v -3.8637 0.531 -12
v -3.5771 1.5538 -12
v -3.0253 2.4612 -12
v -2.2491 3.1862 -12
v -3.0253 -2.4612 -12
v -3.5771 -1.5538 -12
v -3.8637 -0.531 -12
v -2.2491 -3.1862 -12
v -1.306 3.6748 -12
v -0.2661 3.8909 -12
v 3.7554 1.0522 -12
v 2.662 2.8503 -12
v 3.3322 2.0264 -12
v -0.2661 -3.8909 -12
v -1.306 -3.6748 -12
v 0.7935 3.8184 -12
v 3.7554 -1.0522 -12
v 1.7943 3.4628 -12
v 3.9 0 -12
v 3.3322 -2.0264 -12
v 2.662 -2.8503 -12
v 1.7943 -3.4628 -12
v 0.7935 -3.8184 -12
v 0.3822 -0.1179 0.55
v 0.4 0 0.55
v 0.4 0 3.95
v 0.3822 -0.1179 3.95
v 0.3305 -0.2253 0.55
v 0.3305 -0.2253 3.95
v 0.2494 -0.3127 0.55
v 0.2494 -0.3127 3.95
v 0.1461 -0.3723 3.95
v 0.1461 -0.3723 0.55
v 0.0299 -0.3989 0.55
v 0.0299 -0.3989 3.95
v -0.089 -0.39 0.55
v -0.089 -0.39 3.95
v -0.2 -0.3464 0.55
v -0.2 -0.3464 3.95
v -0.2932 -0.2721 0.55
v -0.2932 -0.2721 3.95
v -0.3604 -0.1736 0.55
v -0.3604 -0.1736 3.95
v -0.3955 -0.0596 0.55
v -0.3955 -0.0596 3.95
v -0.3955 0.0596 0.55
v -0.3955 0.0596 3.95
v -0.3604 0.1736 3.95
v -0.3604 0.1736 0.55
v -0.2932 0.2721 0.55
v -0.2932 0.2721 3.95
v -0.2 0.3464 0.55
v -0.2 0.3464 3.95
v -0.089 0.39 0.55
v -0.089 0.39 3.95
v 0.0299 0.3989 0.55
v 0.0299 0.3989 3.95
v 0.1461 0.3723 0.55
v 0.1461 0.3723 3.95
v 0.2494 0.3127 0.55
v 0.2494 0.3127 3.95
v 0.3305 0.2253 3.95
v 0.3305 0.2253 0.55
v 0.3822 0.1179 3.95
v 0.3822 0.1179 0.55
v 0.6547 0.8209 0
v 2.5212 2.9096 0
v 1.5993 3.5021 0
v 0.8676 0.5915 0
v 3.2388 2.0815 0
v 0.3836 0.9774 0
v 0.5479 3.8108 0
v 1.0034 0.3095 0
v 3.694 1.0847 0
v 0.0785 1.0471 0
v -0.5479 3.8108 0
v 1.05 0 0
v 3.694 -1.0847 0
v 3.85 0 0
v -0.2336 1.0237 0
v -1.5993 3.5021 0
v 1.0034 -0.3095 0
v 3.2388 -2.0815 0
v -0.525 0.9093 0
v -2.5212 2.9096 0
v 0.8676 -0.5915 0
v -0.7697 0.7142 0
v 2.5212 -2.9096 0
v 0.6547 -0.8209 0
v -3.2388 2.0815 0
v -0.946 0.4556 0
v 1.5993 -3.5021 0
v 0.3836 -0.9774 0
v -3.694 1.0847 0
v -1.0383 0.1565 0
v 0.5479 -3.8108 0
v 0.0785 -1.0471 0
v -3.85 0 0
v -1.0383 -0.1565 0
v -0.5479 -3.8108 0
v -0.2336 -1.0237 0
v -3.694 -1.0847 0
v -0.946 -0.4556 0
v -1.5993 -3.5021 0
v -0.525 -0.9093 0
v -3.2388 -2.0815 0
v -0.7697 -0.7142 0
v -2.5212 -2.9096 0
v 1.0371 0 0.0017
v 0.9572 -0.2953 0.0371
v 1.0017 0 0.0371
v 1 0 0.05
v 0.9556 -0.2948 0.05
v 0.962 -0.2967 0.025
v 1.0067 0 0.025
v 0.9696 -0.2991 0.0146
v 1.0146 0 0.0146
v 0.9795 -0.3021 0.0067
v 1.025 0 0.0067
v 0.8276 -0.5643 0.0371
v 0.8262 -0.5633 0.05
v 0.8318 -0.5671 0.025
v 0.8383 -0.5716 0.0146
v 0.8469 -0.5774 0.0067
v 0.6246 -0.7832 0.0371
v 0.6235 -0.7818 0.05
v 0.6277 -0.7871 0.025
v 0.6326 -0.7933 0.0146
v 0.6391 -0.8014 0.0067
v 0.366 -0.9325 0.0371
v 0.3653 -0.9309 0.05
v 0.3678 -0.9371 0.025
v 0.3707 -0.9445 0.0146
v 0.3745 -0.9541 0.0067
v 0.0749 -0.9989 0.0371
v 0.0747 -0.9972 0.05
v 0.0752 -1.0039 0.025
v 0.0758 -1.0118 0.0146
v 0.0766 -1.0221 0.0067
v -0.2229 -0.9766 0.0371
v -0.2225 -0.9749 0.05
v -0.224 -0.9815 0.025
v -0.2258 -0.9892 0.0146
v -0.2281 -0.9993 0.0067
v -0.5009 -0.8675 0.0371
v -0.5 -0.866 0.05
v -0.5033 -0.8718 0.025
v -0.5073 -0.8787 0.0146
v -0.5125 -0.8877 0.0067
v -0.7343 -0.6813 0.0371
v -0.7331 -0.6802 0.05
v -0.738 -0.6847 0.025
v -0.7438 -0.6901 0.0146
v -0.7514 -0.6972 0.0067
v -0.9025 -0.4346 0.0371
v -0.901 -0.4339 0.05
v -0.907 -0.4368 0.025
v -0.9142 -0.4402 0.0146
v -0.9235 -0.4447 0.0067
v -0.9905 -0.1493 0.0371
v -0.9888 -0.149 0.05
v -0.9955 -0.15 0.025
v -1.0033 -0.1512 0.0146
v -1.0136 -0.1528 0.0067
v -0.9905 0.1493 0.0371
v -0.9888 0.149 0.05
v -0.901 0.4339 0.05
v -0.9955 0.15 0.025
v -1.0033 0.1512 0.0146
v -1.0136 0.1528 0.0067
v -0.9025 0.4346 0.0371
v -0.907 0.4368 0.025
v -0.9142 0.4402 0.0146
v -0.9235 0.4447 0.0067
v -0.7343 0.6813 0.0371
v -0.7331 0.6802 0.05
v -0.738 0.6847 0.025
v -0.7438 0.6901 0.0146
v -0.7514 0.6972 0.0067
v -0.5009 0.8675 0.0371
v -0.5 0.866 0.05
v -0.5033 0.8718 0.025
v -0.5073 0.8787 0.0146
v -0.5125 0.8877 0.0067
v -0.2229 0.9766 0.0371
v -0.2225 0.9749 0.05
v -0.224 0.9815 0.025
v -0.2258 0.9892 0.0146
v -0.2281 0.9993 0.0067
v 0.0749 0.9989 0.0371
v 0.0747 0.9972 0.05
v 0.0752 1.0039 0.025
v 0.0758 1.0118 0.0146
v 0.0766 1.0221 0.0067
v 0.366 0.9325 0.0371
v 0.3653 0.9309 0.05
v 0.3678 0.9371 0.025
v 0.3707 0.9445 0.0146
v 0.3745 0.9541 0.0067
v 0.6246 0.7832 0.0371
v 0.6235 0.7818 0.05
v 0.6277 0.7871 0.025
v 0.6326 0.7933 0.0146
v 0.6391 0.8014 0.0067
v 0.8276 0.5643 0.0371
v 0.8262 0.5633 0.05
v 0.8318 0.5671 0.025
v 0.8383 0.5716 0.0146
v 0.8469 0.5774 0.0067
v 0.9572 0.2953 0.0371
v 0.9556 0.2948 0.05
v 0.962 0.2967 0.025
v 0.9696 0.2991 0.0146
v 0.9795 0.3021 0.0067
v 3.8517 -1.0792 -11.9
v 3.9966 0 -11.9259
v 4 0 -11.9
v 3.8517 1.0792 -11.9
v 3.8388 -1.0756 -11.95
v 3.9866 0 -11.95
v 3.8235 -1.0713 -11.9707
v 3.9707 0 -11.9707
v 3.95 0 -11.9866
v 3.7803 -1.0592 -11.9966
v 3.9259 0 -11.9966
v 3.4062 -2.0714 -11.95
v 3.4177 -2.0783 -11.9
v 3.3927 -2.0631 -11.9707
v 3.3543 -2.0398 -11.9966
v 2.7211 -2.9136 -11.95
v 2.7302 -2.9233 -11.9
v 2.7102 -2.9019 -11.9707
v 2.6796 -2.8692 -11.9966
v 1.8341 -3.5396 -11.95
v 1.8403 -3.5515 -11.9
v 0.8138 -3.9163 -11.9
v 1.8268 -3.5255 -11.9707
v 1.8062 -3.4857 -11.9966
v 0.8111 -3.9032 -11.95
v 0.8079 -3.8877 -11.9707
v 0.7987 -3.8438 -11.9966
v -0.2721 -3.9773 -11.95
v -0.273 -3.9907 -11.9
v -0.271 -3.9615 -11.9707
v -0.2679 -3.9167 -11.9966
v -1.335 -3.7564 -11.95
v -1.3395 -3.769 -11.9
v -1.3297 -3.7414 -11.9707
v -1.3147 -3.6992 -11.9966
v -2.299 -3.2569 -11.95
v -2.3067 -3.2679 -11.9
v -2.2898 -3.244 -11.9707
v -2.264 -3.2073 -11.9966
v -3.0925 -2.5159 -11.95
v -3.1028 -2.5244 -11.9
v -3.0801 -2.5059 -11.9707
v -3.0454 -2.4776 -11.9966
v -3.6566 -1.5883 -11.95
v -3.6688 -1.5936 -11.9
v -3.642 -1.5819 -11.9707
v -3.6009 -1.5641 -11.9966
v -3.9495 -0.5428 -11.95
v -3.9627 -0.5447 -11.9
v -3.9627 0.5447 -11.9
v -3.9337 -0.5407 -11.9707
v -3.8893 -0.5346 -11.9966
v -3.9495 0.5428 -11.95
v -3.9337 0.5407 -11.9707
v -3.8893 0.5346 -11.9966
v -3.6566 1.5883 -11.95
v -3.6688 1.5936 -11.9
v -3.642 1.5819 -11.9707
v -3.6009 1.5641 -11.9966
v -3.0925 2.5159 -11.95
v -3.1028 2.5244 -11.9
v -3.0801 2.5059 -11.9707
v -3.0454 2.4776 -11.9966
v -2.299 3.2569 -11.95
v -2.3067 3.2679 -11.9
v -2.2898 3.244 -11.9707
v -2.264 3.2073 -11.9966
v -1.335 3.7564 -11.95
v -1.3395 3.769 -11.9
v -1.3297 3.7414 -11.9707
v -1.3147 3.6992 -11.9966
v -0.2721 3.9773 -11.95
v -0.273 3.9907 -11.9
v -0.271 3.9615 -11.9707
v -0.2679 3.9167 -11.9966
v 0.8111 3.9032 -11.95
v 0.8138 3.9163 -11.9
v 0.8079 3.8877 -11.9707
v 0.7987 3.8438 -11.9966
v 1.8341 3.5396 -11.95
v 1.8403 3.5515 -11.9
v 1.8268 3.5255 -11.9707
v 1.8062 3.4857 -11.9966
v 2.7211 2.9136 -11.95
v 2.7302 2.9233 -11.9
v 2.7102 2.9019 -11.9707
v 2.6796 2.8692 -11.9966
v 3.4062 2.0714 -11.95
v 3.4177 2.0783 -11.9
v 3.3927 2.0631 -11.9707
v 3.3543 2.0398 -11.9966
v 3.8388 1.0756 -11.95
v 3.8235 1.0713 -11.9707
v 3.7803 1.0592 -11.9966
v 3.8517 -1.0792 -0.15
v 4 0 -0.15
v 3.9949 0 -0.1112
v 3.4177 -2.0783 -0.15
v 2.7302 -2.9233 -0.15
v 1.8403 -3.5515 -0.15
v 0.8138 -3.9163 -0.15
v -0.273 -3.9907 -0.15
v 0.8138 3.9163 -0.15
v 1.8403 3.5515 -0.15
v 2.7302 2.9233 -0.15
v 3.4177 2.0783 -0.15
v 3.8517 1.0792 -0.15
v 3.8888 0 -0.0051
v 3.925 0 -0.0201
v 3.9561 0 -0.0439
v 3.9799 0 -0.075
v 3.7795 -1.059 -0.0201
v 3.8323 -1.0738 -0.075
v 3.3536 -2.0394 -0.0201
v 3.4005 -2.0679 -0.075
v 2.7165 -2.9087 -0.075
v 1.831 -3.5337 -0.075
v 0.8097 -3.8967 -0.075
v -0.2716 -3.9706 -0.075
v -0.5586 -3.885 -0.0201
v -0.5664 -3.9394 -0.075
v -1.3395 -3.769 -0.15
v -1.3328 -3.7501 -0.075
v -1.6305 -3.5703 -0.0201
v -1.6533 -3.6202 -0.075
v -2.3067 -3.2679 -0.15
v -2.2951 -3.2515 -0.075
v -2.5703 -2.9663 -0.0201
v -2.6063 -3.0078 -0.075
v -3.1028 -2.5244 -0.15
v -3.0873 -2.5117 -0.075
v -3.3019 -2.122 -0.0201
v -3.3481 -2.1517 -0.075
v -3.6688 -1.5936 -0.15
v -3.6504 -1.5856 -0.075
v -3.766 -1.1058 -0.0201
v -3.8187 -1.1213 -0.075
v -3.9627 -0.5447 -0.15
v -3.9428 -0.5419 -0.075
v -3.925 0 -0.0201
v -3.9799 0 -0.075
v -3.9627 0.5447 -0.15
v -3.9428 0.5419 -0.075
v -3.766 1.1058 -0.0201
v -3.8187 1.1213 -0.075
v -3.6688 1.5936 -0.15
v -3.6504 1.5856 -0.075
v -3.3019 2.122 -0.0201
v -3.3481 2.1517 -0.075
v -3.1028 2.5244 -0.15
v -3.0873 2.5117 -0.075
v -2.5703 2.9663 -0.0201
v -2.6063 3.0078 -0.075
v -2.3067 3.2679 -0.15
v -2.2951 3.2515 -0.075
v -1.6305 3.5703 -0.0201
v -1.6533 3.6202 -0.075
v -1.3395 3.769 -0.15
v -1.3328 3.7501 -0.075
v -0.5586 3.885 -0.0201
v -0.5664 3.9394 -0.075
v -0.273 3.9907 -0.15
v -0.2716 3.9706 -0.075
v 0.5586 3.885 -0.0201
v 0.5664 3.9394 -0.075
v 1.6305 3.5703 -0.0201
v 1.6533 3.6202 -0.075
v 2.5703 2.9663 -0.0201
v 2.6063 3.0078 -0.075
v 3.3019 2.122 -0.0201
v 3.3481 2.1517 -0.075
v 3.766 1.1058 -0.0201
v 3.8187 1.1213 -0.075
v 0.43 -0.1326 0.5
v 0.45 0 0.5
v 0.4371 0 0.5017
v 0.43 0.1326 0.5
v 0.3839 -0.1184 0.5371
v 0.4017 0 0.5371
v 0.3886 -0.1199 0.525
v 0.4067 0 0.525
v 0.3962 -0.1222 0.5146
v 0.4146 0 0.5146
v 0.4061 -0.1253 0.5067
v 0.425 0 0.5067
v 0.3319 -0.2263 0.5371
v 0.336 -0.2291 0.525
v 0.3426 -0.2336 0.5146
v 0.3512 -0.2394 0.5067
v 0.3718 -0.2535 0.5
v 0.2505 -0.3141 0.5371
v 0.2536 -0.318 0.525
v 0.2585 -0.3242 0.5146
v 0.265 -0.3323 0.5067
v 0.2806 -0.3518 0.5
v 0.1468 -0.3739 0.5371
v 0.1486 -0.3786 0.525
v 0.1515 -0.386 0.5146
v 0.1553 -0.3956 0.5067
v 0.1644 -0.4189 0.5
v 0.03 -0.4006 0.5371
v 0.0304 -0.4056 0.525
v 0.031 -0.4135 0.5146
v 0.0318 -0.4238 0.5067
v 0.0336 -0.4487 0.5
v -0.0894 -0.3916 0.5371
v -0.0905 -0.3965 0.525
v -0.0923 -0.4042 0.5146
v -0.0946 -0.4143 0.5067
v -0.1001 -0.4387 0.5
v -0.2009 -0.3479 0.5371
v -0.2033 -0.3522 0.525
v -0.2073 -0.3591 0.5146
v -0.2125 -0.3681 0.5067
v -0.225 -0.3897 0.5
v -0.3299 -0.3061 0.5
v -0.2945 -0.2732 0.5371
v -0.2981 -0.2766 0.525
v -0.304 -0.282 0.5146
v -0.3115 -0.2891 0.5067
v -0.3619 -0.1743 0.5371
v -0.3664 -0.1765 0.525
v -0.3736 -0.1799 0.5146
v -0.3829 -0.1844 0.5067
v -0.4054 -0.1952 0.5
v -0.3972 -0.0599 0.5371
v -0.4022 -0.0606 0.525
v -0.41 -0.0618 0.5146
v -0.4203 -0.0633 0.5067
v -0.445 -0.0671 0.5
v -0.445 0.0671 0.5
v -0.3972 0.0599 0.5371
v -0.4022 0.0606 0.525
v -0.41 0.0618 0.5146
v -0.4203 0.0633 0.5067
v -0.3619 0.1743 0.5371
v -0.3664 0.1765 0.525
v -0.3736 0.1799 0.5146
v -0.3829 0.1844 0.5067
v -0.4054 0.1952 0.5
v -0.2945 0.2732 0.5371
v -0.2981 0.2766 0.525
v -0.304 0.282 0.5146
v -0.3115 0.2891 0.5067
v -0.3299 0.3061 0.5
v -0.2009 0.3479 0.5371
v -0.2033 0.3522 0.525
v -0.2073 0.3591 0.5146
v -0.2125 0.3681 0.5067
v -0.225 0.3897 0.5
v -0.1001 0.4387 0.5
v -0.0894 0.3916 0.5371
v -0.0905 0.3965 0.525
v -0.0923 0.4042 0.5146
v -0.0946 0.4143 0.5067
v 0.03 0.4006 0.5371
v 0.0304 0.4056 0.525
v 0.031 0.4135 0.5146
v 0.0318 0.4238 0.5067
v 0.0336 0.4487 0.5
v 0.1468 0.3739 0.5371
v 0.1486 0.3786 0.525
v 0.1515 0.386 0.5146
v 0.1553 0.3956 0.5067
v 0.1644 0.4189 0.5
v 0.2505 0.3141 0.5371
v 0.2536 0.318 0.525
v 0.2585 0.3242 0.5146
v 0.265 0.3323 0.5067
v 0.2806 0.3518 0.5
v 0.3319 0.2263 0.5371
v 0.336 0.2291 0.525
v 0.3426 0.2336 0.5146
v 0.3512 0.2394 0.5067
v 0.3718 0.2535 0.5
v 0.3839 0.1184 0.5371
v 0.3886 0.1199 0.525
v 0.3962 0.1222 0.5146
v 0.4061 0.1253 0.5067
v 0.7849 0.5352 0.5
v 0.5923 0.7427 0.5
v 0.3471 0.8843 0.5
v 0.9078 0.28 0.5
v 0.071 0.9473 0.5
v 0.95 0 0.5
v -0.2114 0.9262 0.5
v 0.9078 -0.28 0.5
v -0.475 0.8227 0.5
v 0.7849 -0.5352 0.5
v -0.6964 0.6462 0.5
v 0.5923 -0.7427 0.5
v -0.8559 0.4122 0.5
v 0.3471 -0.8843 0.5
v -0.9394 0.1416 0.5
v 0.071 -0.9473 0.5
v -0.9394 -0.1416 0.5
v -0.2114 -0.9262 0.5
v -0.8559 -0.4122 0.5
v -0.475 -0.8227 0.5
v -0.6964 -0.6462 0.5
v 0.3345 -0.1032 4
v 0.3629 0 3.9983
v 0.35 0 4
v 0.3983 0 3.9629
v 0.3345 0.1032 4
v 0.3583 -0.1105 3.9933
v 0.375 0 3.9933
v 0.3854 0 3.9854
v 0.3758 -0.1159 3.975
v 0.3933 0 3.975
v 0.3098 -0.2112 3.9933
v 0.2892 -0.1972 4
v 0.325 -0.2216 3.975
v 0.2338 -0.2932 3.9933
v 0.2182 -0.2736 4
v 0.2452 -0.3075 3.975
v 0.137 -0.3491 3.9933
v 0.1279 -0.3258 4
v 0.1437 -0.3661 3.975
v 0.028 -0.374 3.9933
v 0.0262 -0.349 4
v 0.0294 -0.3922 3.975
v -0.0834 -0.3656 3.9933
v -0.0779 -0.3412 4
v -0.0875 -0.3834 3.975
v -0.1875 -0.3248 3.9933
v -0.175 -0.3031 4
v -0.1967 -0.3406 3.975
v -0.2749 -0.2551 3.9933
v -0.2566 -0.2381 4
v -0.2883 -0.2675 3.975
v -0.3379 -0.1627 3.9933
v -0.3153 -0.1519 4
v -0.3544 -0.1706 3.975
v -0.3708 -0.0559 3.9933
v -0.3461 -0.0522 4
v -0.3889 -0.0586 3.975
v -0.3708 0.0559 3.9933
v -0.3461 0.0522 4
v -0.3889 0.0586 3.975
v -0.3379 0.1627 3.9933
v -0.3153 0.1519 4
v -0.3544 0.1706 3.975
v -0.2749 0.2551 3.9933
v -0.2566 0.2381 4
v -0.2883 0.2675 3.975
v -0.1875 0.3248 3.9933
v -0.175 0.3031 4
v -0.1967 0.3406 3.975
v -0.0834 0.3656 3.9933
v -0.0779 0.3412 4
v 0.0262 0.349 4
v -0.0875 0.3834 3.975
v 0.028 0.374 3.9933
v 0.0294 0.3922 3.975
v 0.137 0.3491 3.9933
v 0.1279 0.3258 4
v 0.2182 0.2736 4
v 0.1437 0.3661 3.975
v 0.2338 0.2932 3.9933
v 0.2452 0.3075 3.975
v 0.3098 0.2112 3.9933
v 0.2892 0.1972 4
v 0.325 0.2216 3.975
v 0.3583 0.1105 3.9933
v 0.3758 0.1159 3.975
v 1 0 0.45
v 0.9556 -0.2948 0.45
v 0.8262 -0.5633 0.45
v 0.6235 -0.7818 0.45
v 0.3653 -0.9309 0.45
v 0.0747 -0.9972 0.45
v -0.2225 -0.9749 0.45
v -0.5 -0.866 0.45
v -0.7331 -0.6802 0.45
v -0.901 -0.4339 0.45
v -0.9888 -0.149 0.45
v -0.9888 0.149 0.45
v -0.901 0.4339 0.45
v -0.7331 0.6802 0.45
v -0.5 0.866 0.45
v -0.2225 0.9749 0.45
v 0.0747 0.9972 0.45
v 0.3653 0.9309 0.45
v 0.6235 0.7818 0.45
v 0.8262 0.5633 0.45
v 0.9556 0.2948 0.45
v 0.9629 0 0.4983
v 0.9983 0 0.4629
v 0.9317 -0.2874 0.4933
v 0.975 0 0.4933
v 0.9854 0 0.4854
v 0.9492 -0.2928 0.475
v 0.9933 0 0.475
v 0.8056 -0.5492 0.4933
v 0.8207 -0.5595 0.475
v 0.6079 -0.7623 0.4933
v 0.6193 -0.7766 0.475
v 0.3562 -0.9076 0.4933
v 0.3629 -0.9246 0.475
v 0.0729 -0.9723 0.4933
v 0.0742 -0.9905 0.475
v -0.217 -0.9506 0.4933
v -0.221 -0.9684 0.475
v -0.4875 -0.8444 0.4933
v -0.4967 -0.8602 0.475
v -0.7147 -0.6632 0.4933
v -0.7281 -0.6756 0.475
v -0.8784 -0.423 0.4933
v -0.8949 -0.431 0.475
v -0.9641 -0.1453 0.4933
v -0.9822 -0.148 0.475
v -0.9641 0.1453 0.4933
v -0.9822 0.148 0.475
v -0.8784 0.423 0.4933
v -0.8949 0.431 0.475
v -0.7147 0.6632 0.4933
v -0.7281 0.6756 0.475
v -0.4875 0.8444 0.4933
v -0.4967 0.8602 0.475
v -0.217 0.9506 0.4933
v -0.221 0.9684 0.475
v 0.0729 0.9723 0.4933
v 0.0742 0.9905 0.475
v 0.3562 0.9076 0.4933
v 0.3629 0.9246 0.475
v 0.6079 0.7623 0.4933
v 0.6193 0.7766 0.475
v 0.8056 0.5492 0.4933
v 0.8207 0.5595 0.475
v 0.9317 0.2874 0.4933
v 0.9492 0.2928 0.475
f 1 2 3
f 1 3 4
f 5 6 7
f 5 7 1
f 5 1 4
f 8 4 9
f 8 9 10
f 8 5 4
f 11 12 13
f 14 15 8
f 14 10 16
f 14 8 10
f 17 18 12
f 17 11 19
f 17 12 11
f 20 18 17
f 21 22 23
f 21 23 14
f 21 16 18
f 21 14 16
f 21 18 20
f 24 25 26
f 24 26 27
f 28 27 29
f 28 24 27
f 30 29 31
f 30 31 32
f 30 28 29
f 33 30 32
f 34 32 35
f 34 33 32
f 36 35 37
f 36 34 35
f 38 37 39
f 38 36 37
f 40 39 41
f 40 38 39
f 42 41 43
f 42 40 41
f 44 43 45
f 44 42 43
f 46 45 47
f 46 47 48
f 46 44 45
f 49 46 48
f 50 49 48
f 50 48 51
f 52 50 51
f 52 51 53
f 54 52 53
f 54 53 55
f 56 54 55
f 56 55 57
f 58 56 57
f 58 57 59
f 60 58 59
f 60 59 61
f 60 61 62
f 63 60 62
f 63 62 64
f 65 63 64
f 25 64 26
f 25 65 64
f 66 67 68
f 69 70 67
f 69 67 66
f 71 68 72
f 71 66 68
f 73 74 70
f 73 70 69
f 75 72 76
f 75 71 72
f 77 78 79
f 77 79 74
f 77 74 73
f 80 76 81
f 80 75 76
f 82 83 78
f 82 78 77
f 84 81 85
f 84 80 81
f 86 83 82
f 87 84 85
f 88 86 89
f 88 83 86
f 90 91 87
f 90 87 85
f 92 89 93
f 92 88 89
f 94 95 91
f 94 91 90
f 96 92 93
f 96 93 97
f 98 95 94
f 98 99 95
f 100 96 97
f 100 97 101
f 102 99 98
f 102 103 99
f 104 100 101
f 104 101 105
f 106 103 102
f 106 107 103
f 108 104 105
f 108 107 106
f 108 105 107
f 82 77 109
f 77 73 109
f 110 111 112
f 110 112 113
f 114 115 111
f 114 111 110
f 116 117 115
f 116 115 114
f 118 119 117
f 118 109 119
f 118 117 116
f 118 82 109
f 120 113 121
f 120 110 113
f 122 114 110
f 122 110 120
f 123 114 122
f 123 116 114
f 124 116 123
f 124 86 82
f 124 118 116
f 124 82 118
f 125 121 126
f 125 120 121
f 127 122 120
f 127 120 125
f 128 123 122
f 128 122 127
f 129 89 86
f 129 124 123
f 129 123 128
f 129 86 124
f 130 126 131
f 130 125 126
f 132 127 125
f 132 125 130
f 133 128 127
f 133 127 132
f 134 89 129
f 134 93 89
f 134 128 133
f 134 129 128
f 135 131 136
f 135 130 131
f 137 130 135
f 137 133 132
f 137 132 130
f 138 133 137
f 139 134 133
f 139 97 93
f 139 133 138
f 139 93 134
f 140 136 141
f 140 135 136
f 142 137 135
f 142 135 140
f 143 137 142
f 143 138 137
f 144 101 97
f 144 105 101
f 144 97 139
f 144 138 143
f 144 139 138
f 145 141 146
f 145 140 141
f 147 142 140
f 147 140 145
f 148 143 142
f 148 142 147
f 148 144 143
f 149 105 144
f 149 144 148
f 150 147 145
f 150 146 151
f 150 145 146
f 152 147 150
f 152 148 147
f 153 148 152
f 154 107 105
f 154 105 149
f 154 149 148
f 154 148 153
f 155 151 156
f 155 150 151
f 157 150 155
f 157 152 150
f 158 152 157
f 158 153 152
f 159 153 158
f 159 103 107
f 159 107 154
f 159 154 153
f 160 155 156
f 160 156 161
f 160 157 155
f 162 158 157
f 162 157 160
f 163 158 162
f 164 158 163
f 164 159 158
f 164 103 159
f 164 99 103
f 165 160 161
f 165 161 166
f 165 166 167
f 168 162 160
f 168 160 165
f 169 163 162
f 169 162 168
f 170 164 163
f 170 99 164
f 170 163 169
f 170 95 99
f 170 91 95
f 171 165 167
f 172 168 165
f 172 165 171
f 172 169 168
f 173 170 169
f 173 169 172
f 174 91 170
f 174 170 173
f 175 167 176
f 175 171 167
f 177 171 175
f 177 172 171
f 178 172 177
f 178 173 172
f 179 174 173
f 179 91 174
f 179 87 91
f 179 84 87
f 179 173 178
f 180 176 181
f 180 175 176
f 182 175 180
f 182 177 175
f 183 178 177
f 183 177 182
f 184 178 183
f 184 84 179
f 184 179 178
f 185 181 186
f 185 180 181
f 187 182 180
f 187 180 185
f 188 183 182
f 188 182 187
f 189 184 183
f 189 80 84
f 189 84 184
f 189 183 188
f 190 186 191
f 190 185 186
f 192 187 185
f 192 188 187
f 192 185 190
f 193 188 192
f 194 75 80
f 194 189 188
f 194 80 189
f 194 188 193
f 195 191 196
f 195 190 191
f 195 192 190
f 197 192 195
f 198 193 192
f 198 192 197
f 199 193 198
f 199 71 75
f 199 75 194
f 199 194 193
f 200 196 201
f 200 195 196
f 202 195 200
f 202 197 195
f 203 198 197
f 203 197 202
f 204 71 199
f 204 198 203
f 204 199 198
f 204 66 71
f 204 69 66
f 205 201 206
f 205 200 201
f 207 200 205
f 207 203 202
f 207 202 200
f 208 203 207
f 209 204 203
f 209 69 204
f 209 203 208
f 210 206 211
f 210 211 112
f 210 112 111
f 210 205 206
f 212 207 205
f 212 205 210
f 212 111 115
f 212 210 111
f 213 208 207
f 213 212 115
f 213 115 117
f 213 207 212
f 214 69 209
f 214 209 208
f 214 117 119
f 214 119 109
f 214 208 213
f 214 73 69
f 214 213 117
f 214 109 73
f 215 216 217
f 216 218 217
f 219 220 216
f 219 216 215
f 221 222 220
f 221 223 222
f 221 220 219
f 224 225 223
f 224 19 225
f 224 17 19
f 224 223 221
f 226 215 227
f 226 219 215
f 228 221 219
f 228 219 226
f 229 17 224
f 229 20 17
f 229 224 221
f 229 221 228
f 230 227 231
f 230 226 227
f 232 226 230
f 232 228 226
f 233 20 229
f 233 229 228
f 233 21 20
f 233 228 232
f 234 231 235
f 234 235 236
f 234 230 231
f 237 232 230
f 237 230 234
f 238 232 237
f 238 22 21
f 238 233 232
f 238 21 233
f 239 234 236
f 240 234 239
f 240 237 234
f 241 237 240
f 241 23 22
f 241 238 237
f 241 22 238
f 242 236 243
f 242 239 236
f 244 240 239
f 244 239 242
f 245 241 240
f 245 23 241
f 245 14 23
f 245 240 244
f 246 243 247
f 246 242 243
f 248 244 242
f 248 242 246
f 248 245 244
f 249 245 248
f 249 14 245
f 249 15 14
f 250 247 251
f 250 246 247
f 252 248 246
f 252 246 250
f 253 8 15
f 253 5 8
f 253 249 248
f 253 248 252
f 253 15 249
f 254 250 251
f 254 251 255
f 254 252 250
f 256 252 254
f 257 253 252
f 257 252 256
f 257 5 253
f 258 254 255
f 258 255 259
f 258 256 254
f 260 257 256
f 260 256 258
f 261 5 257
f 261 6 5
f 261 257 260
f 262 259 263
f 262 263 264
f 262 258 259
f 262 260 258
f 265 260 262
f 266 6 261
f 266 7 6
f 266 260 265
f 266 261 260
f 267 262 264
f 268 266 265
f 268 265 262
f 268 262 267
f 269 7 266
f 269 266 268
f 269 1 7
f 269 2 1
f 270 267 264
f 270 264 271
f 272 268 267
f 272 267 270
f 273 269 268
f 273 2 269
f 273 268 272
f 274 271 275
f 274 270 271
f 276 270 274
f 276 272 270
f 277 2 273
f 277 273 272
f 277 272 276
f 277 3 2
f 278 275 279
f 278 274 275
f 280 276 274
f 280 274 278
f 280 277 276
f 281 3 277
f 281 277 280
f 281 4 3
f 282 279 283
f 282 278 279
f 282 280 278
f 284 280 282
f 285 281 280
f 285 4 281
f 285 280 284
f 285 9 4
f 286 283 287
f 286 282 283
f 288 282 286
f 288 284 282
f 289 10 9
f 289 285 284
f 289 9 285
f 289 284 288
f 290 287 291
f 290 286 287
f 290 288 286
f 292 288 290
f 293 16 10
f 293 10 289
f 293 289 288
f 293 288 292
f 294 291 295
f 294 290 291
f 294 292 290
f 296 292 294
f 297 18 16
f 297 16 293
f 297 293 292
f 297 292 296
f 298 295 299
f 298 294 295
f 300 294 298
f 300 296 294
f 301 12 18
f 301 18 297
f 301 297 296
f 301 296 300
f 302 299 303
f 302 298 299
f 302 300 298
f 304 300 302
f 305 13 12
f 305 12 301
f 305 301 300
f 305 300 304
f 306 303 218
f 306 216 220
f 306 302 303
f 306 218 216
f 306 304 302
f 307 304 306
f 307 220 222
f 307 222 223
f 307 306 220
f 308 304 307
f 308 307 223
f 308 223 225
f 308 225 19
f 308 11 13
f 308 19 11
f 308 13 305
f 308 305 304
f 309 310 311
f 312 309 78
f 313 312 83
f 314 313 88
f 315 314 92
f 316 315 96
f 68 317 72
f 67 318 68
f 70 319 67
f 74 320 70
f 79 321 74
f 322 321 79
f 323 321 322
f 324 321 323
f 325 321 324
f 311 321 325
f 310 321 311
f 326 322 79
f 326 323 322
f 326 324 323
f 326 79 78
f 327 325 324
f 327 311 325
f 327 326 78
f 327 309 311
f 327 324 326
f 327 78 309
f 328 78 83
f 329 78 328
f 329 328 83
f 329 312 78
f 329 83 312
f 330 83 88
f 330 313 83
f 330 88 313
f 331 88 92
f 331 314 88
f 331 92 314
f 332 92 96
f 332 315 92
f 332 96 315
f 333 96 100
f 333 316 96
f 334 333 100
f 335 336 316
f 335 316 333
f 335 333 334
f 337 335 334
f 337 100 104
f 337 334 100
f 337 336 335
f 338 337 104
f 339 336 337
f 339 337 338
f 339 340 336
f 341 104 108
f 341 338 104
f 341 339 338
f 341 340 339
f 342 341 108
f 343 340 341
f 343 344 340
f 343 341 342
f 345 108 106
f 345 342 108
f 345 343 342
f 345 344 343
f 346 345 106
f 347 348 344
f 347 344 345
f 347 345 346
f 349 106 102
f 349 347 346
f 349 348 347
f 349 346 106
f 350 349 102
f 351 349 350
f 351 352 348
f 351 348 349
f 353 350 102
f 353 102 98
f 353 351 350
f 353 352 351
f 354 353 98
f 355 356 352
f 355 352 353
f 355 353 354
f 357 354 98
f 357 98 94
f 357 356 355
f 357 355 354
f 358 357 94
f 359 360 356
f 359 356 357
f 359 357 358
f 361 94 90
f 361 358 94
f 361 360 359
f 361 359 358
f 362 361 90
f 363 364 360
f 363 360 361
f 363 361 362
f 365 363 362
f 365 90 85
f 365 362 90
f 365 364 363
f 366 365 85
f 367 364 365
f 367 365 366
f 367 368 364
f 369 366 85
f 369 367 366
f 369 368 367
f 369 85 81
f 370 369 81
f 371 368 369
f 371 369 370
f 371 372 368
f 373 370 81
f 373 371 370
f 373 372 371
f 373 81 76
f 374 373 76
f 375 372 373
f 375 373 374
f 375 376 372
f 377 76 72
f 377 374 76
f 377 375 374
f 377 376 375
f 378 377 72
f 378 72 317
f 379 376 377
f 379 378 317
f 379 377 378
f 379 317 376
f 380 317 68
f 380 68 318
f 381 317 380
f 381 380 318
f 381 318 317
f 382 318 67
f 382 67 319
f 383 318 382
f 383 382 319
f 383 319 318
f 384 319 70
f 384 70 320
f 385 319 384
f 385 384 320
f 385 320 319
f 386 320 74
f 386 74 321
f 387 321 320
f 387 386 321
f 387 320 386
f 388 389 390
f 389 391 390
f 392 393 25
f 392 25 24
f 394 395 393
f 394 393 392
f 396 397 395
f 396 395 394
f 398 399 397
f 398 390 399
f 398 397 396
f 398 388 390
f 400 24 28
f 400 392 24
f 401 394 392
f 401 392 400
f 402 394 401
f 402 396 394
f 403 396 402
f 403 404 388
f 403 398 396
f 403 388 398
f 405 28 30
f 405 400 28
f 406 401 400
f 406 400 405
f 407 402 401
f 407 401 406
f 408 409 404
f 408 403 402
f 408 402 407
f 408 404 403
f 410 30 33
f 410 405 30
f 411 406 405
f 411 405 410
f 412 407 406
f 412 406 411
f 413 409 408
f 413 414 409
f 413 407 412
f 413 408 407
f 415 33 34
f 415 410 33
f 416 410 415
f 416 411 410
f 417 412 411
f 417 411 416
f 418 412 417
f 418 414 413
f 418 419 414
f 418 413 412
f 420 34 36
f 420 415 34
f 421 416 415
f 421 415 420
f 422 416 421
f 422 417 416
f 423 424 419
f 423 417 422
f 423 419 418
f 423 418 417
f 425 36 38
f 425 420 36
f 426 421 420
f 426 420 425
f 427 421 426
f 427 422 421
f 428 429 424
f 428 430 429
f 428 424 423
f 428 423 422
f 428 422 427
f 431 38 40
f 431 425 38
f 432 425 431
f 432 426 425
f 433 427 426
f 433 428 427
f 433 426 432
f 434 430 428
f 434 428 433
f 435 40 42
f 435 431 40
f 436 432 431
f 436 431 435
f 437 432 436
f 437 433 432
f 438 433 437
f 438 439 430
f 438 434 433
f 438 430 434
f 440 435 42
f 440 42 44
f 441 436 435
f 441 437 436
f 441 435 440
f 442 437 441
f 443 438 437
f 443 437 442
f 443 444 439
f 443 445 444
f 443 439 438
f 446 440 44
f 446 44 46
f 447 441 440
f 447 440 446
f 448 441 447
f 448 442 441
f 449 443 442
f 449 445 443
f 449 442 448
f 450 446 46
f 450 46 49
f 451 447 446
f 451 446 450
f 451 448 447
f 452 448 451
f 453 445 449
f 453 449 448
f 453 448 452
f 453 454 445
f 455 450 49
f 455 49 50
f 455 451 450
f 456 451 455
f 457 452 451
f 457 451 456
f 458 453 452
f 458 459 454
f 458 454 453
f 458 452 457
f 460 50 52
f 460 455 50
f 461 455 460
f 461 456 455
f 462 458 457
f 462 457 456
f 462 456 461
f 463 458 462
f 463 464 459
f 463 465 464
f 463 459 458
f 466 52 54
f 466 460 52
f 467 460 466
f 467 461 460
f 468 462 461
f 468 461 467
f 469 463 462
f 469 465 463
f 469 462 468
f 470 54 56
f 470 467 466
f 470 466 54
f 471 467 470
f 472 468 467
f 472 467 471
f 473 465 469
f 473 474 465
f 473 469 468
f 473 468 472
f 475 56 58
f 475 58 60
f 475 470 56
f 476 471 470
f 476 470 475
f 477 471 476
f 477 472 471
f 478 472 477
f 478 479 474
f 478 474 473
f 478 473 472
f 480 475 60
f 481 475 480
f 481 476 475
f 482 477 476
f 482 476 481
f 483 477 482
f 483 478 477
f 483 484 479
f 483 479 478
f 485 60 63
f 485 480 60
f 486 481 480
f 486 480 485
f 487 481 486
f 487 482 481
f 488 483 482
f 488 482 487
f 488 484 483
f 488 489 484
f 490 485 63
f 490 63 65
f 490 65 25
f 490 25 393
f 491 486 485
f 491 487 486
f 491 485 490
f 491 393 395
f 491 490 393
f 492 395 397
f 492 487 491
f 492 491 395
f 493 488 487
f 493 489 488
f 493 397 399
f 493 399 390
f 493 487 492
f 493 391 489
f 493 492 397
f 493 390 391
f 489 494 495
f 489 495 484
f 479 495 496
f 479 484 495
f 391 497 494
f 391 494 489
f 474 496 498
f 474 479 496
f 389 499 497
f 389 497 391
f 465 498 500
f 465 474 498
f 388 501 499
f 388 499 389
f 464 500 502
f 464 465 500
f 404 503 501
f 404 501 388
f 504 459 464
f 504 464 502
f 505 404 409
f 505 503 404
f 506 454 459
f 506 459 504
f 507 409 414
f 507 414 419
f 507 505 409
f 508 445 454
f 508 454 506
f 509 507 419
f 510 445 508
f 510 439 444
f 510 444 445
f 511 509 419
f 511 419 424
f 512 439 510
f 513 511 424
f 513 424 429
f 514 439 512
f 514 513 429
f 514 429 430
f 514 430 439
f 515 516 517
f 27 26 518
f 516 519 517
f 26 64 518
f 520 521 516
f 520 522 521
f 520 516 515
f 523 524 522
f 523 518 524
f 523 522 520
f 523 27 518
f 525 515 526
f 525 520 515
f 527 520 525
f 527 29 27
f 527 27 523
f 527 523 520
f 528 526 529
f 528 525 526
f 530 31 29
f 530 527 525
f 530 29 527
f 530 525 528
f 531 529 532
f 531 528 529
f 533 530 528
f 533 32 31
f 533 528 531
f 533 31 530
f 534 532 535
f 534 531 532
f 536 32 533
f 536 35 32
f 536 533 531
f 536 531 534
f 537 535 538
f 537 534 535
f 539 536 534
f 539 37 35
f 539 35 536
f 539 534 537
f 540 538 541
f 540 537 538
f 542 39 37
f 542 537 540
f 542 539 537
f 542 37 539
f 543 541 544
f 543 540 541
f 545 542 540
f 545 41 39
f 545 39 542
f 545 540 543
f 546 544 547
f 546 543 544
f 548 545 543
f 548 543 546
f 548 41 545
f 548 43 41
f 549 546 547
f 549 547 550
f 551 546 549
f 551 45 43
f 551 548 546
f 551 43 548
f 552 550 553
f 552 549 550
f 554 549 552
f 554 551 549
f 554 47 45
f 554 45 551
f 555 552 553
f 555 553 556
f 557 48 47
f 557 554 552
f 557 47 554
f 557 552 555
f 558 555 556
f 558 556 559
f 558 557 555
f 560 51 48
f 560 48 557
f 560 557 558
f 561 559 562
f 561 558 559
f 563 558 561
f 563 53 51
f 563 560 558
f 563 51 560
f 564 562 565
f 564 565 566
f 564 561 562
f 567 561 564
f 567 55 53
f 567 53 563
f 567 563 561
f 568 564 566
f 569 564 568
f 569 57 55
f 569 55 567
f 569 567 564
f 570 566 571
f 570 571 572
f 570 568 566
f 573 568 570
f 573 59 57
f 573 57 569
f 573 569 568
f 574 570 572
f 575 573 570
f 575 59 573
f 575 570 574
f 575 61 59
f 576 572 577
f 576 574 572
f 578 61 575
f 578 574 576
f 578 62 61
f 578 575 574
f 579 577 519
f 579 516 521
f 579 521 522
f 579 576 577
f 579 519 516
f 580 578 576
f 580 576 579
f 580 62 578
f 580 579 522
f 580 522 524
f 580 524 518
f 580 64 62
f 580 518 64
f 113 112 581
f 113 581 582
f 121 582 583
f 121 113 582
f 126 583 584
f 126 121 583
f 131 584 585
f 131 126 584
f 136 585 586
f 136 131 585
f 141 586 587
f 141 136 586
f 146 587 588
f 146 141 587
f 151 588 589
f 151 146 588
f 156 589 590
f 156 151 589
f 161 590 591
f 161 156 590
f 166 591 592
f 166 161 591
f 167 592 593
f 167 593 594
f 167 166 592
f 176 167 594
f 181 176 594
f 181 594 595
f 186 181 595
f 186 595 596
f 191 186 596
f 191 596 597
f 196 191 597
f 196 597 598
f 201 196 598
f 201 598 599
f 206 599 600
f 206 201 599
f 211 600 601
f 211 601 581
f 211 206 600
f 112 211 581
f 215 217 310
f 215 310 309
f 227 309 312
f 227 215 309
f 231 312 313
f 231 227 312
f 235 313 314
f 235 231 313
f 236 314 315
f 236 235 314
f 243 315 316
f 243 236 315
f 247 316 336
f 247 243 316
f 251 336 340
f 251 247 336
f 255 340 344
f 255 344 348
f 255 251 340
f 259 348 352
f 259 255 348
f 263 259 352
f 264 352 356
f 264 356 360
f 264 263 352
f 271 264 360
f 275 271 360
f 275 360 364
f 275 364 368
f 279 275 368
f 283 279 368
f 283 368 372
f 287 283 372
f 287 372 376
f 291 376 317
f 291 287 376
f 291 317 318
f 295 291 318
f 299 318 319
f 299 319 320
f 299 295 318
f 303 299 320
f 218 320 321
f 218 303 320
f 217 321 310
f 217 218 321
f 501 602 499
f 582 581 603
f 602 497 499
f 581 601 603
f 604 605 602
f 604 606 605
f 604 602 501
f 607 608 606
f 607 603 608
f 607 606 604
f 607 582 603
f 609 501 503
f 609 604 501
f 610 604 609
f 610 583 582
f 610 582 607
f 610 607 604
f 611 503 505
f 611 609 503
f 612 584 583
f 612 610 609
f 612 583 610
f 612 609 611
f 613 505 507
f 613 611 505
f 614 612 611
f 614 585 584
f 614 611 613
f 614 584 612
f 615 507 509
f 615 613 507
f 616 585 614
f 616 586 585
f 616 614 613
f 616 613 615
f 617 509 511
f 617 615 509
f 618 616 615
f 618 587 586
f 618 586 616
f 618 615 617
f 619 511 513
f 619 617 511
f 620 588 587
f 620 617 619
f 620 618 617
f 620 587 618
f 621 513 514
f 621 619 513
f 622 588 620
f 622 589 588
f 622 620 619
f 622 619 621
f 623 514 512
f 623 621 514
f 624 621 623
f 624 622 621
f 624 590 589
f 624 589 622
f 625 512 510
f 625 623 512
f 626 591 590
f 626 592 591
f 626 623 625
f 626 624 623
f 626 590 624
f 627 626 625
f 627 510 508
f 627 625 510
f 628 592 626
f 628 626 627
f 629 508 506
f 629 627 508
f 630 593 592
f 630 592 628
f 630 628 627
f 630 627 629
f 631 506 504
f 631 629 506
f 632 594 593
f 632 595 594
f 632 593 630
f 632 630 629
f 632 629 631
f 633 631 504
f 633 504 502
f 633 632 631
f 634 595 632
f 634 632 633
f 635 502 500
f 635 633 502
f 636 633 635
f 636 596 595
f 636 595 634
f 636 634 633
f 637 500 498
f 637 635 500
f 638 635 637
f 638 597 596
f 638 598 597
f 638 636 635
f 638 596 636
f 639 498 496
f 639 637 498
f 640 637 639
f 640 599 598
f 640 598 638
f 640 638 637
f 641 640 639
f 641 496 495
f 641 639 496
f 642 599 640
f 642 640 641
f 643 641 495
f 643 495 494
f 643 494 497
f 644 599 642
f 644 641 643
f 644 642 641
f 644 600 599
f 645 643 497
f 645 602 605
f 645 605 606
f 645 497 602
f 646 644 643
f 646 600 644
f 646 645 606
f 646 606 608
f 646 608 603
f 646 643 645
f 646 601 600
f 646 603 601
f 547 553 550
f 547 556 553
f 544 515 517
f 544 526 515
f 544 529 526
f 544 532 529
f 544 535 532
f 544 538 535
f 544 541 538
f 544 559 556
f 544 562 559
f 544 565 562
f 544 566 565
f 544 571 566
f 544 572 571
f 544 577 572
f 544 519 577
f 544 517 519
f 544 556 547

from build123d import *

# Parameters (mm, degrees)
FILLET1_R = 0.05
FILLET3_R = 0.15
FILLET4_R = 0.1


with BuildPart() as part:
    # Sketch1 → Revolve1 (revolve)
    with BuildSketch(Plane(origin=(0, 0, 0), x_dir=(0, 0, -1), z_dir=(1, 0, 0)), mode=Mode.PRIVATE) as revolve1_sk:
        Polygon((0, 4), (12, 4), (12, 0), (-4, 0), (-4, 0.4), (-0.5, 0.4), (-0.5, 1), (0, 1), align=None)
    revolve(revolve1_sk.sketch.rotate(Axis((0, 0, 94.83033259), (0, 0, -1)), 90), axis=Axis((0, 0, 94.83033259), (0, 0, -1)))

    # Fillet1
    fillet1_edges = [part.edges().sort_by_distance(p)[0] for p in [
        (-1, 0, 0),
        (-1, 0, 0.5),
        (-0.4, 0, 0.5),
        (-0.4, 0, 4),
    ]]
    fillet(fillet1_edges, radius=FILLET1_R)

    # Fillet3
    fillet3_edges = [part.edges().sort_by_distance(p)[0] for p in [
        (-4, 0, 0),
    ]]
    fillet(fillet3_edges, radius=FILLET3_R)

    # Fillet4
    fillet4_edges = [part.edges().sort_by_distance(p)[0] for p in [
        (-4, 0, -12),
    ]]
    fillet(fillet4_edges, radius=FILLET4_R)


solid = part.part
